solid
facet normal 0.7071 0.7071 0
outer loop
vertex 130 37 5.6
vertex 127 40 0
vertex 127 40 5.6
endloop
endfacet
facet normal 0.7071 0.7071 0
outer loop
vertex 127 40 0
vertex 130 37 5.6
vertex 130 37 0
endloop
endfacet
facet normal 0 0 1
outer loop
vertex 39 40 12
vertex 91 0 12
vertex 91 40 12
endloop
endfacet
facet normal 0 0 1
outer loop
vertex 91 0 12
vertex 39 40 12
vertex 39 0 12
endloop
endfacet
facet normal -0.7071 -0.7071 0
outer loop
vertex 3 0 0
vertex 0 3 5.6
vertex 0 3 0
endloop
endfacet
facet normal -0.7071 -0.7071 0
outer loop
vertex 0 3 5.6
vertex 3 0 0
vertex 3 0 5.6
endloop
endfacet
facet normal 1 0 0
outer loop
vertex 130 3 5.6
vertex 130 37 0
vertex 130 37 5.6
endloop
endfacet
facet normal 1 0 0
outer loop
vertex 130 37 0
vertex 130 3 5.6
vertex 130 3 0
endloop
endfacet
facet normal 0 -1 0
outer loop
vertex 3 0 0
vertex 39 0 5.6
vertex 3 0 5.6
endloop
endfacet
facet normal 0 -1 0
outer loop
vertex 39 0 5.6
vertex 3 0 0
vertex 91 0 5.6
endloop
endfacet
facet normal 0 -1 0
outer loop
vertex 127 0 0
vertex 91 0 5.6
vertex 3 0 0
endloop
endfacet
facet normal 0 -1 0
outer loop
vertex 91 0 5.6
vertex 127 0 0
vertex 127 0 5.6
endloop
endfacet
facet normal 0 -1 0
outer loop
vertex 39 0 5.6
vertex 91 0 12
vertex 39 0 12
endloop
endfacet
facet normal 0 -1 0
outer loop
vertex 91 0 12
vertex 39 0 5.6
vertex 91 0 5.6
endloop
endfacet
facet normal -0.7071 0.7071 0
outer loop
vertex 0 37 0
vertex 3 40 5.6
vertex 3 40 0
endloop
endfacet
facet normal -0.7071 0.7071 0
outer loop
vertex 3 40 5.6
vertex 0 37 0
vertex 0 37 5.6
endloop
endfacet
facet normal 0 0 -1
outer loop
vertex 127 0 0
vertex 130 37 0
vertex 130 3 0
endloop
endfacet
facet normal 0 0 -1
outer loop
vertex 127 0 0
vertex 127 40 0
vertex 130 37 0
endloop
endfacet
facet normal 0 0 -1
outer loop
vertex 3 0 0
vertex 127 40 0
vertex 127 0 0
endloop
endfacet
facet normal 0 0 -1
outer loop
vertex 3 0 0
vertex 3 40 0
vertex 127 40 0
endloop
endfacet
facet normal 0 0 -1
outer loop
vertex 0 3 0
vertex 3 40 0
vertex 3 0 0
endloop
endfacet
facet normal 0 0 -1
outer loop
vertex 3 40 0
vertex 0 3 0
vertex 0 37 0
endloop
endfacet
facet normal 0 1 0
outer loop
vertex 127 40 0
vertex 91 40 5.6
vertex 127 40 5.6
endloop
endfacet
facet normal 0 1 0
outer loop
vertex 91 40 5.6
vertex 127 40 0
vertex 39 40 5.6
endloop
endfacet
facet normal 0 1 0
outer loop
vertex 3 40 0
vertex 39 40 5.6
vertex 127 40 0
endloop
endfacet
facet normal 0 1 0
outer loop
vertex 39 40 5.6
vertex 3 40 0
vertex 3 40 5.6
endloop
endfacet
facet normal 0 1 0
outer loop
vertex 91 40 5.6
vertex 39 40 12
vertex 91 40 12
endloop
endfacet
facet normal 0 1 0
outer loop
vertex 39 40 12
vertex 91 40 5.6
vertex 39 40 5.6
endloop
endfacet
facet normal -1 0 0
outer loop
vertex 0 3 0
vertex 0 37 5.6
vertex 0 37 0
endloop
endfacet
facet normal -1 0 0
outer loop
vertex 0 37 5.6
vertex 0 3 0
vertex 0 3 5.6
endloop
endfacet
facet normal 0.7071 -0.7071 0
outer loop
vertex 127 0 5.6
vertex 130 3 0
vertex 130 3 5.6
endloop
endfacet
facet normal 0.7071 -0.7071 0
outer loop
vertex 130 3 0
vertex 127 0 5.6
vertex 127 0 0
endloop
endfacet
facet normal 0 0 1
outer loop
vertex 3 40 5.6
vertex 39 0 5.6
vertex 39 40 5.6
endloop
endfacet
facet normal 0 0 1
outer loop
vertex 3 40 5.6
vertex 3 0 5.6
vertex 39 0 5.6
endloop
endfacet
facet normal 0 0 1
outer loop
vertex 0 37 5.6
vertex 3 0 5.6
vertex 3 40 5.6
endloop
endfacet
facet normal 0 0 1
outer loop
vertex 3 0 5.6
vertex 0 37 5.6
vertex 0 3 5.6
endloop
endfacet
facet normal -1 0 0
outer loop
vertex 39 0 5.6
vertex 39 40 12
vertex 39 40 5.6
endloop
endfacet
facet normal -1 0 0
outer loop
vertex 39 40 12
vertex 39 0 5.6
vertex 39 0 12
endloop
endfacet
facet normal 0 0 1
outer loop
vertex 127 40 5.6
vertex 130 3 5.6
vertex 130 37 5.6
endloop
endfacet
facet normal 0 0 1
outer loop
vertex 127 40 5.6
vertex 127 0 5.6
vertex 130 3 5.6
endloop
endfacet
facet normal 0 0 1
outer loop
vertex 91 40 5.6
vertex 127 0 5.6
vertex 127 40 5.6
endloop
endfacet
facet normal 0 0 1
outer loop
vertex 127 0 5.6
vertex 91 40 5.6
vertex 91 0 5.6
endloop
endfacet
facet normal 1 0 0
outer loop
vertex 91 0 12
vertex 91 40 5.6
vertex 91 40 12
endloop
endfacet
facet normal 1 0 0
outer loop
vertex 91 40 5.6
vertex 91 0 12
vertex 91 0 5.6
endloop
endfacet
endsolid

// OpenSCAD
$fn = 32;

// ----------------------------------------------------------------------
// Stepped bar: centerstep, 130 x 40 x 12/5.6 mm
// ----------------------------------------------------------------------

// --- parameters (mm) ---
bar_l = 130;              // bar length, X
bar_w = 40;               // bar width, Y
plate_t = 12;             // thickness of the thick zone, Z
thin_t = 5.6;             // thickness of the thin zone
corner_c = 3;             // corner chamfer of the bar
step_cut = 6.4;           // material removed from the thin zone
thick_from = 39;          // start of the thick middle zone
thick_to = 91;            // end of the thick middle zone
depth_1 = 6.4;            // depth of cut 1 from the top face
depth_2 = 6.4;            // depth of cut 2 from the top face

profile = [[3, 0], [127, 0], [130, 3], [130, 37], [127, 40], [3, 40], [0, 37], [0, 3]];  // primary outline, 8 points, counter clockwise
void_1 = [[-1, -1], [39, -1], [39, 41], [-1, 41]];  // thin left end, 4 points
void_2 = [[91, -1], [131, -1], [131, 41], [91, 41]];  // thin right end, 4 points

// --- the one profile operation ---
difference() {
  linear_extrude(height = plate_t) polygon(points = profile);
  translate([0, 0, plate_t - depth_1])
    linear_extrude(height = depth_1 + 1) polygon(points = void_1);
  translate([0, 0, plate_t - depth_2])
    linear_extrude(height = depth_2 + 1) polygon(points = void_2);
}
